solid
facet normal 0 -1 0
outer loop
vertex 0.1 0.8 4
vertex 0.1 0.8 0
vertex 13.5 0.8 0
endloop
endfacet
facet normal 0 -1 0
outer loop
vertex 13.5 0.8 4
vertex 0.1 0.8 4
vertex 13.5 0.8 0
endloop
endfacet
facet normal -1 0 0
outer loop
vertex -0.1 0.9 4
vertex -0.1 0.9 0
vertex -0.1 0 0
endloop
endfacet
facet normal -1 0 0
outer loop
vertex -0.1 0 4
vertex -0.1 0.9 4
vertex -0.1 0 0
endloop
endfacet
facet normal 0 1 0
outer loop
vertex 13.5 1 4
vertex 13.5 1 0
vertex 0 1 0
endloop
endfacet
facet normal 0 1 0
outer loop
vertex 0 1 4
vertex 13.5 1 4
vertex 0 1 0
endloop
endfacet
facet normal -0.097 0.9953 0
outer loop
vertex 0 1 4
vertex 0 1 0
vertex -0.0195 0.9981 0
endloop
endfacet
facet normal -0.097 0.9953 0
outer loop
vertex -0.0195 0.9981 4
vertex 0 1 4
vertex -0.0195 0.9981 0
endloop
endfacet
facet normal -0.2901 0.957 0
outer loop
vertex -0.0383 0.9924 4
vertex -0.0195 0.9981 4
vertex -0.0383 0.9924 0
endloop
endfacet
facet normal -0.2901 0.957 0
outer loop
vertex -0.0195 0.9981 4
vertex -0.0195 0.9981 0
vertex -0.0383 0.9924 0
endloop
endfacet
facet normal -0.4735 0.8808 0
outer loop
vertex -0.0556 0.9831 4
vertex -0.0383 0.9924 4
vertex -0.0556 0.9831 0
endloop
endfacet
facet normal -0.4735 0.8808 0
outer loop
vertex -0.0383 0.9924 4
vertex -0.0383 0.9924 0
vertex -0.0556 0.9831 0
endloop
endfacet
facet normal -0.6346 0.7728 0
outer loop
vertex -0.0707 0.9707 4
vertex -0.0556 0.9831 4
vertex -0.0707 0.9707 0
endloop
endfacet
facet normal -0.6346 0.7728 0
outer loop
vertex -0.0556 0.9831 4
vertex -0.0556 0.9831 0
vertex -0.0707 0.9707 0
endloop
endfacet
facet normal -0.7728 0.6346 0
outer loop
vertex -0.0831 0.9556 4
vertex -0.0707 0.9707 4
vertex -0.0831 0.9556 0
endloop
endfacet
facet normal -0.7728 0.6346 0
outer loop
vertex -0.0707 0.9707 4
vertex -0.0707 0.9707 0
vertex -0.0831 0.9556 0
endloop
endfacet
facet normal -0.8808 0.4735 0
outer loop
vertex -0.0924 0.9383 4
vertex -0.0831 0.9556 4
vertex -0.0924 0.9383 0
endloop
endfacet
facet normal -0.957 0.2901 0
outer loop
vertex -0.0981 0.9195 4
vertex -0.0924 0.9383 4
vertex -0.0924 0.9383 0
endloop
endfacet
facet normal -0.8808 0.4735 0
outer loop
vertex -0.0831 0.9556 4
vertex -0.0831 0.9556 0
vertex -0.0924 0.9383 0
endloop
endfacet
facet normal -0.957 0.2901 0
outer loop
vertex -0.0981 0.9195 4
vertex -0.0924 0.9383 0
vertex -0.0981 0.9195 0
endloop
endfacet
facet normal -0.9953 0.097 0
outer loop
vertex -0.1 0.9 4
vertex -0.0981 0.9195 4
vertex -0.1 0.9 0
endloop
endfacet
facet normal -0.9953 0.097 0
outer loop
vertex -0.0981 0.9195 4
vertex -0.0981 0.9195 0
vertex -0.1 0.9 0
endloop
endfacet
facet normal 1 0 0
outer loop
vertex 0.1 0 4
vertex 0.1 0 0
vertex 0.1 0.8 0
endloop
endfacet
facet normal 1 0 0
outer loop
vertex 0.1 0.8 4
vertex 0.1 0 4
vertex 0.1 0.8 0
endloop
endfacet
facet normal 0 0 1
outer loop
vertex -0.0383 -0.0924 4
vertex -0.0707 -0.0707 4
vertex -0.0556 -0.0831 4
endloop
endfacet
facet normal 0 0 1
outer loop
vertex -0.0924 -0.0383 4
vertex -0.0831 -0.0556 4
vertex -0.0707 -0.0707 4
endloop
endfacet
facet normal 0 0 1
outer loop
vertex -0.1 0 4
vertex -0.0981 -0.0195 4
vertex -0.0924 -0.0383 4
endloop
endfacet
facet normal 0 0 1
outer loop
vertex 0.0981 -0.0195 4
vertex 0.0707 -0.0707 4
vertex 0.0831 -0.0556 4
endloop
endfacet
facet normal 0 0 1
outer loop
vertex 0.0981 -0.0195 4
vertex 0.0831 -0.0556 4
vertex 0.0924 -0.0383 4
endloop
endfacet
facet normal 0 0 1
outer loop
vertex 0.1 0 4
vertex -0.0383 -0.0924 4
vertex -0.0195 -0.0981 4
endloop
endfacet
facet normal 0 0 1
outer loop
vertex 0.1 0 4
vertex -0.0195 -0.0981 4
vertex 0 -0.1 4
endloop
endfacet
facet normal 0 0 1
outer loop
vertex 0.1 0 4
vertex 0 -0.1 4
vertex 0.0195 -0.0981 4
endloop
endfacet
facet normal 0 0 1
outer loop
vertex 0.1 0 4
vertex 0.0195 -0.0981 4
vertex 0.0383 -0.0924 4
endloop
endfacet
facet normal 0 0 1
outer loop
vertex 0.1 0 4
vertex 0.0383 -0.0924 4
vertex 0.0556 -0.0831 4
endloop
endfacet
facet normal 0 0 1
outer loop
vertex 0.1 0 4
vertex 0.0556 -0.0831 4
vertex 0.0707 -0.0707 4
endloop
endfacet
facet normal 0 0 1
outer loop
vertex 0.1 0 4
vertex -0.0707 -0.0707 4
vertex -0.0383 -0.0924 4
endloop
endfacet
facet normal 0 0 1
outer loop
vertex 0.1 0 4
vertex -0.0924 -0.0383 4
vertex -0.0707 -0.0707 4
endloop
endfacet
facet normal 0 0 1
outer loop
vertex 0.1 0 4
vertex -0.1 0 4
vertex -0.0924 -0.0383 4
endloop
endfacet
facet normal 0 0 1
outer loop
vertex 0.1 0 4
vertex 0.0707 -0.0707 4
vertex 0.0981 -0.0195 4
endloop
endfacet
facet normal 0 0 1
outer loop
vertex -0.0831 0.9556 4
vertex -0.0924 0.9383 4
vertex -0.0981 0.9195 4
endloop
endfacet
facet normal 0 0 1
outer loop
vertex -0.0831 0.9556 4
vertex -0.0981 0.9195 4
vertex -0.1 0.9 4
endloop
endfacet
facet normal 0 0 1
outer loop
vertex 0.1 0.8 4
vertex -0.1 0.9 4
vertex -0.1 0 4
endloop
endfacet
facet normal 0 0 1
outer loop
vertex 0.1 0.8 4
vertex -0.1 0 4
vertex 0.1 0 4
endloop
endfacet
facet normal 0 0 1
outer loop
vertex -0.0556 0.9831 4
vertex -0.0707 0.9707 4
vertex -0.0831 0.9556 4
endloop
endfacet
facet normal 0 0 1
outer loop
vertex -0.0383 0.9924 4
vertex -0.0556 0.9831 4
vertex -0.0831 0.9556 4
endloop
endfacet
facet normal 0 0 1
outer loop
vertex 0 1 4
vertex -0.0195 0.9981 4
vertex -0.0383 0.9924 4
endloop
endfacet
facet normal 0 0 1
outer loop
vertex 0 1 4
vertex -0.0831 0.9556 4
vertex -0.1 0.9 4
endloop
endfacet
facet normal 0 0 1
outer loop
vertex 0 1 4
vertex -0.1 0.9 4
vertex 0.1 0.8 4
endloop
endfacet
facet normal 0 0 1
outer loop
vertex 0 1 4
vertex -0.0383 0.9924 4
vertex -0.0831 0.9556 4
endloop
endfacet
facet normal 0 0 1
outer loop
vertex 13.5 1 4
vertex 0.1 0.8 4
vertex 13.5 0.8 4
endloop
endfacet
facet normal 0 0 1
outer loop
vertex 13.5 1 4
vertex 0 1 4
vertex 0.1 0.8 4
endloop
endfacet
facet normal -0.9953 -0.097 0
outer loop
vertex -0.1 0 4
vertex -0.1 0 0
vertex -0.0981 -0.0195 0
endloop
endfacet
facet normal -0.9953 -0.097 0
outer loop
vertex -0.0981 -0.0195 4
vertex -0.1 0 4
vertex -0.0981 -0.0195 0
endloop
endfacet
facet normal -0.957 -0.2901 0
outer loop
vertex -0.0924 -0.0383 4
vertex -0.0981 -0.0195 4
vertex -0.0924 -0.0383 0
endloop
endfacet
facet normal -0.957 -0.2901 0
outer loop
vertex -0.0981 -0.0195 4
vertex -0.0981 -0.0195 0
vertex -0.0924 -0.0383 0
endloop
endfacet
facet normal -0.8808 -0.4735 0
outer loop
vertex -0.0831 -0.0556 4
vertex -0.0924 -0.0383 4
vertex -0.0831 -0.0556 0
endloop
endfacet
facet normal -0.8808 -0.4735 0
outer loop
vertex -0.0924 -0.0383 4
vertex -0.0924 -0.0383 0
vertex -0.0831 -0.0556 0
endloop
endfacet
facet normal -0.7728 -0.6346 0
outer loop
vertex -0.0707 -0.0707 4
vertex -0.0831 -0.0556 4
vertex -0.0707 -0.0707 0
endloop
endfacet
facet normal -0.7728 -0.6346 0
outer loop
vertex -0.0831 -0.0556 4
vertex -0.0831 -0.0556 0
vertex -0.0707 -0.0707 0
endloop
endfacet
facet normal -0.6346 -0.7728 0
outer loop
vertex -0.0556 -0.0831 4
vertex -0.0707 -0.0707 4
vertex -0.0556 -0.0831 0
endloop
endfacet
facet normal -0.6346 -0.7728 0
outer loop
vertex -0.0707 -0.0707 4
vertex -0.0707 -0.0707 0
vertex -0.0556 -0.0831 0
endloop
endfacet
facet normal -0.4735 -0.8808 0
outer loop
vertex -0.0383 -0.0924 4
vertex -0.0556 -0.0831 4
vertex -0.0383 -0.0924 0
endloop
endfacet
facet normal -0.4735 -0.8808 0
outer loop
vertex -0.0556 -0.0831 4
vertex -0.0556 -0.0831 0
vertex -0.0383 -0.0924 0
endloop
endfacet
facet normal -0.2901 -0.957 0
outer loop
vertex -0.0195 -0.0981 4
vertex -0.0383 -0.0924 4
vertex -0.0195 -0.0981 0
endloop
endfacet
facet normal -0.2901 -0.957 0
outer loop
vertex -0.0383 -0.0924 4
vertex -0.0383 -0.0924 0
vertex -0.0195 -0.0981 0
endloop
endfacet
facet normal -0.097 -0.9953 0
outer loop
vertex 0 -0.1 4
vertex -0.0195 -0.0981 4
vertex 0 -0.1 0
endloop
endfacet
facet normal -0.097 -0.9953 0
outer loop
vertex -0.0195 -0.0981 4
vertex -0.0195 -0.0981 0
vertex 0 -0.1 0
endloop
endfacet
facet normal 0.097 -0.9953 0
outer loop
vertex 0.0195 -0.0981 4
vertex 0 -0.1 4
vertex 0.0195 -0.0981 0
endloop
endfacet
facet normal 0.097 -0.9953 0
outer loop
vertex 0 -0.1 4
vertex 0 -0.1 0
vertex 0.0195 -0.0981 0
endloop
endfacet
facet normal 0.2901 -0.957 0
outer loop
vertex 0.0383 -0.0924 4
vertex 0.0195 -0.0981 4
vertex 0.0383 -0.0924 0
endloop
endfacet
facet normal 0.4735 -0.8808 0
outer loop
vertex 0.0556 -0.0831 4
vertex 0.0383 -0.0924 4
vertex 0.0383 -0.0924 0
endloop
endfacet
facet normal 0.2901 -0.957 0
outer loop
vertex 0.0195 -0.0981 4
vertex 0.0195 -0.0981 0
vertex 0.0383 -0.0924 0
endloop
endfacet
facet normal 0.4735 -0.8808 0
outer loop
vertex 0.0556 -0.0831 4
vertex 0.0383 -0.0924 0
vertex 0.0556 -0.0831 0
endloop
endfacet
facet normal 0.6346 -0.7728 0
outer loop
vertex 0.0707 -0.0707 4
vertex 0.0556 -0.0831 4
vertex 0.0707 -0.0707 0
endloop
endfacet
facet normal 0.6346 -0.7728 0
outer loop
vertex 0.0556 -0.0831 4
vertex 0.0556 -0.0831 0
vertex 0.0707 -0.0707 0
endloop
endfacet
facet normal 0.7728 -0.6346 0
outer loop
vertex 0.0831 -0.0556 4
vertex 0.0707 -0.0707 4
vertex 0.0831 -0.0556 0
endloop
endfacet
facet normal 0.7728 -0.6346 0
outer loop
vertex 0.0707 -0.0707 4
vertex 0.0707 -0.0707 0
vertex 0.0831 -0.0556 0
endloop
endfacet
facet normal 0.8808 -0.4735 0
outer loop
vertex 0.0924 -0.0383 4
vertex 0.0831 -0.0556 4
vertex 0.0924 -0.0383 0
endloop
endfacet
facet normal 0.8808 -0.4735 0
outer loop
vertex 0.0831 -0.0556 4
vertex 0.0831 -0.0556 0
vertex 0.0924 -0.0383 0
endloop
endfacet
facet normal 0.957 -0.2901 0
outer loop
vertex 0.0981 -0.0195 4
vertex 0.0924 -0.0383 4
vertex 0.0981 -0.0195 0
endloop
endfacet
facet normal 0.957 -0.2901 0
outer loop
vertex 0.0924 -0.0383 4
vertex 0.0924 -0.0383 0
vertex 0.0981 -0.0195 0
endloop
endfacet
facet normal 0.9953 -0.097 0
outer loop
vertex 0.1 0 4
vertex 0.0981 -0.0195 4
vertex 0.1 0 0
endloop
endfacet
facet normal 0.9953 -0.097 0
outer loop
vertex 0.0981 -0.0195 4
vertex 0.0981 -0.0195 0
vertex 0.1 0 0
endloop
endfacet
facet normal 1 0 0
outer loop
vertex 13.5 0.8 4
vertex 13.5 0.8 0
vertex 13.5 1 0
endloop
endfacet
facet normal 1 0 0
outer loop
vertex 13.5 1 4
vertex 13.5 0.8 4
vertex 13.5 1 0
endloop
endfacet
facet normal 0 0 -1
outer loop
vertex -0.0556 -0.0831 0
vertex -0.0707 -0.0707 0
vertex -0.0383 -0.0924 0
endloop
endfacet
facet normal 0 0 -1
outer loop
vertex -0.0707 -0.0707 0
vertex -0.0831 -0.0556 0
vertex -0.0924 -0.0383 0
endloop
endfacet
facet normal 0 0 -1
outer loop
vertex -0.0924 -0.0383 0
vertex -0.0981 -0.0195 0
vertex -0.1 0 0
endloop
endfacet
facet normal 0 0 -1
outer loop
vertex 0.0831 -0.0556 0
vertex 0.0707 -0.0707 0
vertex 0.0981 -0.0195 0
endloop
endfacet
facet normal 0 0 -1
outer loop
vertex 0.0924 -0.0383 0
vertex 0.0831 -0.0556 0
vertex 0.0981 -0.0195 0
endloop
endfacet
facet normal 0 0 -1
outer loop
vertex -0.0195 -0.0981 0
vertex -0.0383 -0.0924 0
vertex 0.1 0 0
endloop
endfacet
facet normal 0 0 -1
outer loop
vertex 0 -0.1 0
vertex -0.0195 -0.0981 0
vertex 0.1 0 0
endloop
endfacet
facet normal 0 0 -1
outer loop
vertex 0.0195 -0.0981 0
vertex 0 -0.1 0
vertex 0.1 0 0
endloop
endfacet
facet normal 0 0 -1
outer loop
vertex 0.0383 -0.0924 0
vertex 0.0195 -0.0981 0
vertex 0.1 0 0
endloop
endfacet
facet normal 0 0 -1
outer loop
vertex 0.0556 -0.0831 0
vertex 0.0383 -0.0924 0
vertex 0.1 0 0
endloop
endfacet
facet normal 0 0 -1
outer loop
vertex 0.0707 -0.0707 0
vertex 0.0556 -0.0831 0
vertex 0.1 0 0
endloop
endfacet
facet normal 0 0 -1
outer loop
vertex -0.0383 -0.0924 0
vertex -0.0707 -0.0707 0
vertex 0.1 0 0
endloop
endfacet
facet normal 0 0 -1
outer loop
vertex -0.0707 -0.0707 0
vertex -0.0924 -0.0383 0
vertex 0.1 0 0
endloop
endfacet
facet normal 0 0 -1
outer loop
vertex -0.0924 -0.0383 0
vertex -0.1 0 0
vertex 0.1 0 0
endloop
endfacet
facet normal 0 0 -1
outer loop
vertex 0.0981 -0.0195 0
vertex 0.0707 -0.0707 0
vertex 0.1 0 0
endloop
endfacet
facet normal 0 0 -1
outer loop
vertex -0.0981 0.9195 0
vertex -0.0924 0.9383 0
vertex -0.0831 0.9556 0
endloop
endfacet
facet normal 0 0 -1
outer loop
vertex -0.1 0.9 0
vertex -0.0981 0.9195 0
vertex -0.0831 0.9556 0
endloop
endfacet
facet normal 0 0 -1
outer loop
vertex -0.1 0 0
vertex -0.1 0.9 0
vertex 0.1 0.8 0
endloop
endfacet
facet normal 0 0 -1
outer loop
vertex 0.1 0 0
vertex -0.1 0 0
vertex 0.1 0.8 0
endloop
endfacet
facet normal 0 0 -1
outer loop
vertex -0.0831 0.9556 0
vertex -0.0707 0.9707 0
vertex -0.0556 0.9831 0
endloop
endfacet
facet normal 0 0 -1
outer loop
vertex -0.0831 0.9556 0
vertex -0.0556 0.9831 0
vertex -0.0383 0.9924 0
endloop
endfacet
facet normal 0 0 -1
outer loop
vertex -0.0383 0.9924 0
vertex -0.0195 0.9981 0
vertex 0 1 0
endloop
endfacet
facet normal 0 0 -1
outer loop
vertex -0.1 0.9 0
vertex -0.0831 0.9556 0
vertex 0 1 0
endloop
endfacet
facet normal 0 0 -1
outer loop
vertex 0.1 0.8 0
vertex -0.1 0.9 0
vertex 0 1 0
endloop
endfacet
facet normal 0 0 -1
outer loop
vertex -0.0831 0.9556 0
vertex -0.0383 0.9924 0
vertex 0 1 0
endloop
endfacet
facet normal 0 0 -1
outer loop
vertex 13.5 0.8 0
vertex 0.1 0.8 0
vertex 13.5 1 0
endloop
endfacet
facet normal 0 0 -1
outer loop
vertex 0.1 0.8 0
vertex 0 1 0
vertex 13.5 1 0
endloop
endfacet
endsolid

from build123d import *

# Parameters (mm, degrees)
RESSALTO_EXTRUS_O1_DEPTH = 4


with BuildPart() as part:
    # Esboço1 → Ressalto-extrusão1 (new body)
    with BuildSketch(Plane.XY):
        with BuildLine():
            Line((0.1, 0), (0.1, 0.8))
            Line((0.1, 0.8), (13.5, 0.8))
            Line((13.5, 0.8), (13.5, 1))
            Line((13.5, 1), (0, 1))
            ThreePointArc((0, 1), (-0.070710678, 0.970710678), (-0.1, 0.9))
            Line((-0.1, 0.9), (-0.1, 0.8))
            Line((-0.1, 0.8), (-0.1, 0))
            ThreePointArc((-0.1, 0), (0, -0.1), (0.1, 0))
        make_face()
    extrude(amount=RESSALTO_EXTRUS_O1_DEPTH)


solid = part.part
